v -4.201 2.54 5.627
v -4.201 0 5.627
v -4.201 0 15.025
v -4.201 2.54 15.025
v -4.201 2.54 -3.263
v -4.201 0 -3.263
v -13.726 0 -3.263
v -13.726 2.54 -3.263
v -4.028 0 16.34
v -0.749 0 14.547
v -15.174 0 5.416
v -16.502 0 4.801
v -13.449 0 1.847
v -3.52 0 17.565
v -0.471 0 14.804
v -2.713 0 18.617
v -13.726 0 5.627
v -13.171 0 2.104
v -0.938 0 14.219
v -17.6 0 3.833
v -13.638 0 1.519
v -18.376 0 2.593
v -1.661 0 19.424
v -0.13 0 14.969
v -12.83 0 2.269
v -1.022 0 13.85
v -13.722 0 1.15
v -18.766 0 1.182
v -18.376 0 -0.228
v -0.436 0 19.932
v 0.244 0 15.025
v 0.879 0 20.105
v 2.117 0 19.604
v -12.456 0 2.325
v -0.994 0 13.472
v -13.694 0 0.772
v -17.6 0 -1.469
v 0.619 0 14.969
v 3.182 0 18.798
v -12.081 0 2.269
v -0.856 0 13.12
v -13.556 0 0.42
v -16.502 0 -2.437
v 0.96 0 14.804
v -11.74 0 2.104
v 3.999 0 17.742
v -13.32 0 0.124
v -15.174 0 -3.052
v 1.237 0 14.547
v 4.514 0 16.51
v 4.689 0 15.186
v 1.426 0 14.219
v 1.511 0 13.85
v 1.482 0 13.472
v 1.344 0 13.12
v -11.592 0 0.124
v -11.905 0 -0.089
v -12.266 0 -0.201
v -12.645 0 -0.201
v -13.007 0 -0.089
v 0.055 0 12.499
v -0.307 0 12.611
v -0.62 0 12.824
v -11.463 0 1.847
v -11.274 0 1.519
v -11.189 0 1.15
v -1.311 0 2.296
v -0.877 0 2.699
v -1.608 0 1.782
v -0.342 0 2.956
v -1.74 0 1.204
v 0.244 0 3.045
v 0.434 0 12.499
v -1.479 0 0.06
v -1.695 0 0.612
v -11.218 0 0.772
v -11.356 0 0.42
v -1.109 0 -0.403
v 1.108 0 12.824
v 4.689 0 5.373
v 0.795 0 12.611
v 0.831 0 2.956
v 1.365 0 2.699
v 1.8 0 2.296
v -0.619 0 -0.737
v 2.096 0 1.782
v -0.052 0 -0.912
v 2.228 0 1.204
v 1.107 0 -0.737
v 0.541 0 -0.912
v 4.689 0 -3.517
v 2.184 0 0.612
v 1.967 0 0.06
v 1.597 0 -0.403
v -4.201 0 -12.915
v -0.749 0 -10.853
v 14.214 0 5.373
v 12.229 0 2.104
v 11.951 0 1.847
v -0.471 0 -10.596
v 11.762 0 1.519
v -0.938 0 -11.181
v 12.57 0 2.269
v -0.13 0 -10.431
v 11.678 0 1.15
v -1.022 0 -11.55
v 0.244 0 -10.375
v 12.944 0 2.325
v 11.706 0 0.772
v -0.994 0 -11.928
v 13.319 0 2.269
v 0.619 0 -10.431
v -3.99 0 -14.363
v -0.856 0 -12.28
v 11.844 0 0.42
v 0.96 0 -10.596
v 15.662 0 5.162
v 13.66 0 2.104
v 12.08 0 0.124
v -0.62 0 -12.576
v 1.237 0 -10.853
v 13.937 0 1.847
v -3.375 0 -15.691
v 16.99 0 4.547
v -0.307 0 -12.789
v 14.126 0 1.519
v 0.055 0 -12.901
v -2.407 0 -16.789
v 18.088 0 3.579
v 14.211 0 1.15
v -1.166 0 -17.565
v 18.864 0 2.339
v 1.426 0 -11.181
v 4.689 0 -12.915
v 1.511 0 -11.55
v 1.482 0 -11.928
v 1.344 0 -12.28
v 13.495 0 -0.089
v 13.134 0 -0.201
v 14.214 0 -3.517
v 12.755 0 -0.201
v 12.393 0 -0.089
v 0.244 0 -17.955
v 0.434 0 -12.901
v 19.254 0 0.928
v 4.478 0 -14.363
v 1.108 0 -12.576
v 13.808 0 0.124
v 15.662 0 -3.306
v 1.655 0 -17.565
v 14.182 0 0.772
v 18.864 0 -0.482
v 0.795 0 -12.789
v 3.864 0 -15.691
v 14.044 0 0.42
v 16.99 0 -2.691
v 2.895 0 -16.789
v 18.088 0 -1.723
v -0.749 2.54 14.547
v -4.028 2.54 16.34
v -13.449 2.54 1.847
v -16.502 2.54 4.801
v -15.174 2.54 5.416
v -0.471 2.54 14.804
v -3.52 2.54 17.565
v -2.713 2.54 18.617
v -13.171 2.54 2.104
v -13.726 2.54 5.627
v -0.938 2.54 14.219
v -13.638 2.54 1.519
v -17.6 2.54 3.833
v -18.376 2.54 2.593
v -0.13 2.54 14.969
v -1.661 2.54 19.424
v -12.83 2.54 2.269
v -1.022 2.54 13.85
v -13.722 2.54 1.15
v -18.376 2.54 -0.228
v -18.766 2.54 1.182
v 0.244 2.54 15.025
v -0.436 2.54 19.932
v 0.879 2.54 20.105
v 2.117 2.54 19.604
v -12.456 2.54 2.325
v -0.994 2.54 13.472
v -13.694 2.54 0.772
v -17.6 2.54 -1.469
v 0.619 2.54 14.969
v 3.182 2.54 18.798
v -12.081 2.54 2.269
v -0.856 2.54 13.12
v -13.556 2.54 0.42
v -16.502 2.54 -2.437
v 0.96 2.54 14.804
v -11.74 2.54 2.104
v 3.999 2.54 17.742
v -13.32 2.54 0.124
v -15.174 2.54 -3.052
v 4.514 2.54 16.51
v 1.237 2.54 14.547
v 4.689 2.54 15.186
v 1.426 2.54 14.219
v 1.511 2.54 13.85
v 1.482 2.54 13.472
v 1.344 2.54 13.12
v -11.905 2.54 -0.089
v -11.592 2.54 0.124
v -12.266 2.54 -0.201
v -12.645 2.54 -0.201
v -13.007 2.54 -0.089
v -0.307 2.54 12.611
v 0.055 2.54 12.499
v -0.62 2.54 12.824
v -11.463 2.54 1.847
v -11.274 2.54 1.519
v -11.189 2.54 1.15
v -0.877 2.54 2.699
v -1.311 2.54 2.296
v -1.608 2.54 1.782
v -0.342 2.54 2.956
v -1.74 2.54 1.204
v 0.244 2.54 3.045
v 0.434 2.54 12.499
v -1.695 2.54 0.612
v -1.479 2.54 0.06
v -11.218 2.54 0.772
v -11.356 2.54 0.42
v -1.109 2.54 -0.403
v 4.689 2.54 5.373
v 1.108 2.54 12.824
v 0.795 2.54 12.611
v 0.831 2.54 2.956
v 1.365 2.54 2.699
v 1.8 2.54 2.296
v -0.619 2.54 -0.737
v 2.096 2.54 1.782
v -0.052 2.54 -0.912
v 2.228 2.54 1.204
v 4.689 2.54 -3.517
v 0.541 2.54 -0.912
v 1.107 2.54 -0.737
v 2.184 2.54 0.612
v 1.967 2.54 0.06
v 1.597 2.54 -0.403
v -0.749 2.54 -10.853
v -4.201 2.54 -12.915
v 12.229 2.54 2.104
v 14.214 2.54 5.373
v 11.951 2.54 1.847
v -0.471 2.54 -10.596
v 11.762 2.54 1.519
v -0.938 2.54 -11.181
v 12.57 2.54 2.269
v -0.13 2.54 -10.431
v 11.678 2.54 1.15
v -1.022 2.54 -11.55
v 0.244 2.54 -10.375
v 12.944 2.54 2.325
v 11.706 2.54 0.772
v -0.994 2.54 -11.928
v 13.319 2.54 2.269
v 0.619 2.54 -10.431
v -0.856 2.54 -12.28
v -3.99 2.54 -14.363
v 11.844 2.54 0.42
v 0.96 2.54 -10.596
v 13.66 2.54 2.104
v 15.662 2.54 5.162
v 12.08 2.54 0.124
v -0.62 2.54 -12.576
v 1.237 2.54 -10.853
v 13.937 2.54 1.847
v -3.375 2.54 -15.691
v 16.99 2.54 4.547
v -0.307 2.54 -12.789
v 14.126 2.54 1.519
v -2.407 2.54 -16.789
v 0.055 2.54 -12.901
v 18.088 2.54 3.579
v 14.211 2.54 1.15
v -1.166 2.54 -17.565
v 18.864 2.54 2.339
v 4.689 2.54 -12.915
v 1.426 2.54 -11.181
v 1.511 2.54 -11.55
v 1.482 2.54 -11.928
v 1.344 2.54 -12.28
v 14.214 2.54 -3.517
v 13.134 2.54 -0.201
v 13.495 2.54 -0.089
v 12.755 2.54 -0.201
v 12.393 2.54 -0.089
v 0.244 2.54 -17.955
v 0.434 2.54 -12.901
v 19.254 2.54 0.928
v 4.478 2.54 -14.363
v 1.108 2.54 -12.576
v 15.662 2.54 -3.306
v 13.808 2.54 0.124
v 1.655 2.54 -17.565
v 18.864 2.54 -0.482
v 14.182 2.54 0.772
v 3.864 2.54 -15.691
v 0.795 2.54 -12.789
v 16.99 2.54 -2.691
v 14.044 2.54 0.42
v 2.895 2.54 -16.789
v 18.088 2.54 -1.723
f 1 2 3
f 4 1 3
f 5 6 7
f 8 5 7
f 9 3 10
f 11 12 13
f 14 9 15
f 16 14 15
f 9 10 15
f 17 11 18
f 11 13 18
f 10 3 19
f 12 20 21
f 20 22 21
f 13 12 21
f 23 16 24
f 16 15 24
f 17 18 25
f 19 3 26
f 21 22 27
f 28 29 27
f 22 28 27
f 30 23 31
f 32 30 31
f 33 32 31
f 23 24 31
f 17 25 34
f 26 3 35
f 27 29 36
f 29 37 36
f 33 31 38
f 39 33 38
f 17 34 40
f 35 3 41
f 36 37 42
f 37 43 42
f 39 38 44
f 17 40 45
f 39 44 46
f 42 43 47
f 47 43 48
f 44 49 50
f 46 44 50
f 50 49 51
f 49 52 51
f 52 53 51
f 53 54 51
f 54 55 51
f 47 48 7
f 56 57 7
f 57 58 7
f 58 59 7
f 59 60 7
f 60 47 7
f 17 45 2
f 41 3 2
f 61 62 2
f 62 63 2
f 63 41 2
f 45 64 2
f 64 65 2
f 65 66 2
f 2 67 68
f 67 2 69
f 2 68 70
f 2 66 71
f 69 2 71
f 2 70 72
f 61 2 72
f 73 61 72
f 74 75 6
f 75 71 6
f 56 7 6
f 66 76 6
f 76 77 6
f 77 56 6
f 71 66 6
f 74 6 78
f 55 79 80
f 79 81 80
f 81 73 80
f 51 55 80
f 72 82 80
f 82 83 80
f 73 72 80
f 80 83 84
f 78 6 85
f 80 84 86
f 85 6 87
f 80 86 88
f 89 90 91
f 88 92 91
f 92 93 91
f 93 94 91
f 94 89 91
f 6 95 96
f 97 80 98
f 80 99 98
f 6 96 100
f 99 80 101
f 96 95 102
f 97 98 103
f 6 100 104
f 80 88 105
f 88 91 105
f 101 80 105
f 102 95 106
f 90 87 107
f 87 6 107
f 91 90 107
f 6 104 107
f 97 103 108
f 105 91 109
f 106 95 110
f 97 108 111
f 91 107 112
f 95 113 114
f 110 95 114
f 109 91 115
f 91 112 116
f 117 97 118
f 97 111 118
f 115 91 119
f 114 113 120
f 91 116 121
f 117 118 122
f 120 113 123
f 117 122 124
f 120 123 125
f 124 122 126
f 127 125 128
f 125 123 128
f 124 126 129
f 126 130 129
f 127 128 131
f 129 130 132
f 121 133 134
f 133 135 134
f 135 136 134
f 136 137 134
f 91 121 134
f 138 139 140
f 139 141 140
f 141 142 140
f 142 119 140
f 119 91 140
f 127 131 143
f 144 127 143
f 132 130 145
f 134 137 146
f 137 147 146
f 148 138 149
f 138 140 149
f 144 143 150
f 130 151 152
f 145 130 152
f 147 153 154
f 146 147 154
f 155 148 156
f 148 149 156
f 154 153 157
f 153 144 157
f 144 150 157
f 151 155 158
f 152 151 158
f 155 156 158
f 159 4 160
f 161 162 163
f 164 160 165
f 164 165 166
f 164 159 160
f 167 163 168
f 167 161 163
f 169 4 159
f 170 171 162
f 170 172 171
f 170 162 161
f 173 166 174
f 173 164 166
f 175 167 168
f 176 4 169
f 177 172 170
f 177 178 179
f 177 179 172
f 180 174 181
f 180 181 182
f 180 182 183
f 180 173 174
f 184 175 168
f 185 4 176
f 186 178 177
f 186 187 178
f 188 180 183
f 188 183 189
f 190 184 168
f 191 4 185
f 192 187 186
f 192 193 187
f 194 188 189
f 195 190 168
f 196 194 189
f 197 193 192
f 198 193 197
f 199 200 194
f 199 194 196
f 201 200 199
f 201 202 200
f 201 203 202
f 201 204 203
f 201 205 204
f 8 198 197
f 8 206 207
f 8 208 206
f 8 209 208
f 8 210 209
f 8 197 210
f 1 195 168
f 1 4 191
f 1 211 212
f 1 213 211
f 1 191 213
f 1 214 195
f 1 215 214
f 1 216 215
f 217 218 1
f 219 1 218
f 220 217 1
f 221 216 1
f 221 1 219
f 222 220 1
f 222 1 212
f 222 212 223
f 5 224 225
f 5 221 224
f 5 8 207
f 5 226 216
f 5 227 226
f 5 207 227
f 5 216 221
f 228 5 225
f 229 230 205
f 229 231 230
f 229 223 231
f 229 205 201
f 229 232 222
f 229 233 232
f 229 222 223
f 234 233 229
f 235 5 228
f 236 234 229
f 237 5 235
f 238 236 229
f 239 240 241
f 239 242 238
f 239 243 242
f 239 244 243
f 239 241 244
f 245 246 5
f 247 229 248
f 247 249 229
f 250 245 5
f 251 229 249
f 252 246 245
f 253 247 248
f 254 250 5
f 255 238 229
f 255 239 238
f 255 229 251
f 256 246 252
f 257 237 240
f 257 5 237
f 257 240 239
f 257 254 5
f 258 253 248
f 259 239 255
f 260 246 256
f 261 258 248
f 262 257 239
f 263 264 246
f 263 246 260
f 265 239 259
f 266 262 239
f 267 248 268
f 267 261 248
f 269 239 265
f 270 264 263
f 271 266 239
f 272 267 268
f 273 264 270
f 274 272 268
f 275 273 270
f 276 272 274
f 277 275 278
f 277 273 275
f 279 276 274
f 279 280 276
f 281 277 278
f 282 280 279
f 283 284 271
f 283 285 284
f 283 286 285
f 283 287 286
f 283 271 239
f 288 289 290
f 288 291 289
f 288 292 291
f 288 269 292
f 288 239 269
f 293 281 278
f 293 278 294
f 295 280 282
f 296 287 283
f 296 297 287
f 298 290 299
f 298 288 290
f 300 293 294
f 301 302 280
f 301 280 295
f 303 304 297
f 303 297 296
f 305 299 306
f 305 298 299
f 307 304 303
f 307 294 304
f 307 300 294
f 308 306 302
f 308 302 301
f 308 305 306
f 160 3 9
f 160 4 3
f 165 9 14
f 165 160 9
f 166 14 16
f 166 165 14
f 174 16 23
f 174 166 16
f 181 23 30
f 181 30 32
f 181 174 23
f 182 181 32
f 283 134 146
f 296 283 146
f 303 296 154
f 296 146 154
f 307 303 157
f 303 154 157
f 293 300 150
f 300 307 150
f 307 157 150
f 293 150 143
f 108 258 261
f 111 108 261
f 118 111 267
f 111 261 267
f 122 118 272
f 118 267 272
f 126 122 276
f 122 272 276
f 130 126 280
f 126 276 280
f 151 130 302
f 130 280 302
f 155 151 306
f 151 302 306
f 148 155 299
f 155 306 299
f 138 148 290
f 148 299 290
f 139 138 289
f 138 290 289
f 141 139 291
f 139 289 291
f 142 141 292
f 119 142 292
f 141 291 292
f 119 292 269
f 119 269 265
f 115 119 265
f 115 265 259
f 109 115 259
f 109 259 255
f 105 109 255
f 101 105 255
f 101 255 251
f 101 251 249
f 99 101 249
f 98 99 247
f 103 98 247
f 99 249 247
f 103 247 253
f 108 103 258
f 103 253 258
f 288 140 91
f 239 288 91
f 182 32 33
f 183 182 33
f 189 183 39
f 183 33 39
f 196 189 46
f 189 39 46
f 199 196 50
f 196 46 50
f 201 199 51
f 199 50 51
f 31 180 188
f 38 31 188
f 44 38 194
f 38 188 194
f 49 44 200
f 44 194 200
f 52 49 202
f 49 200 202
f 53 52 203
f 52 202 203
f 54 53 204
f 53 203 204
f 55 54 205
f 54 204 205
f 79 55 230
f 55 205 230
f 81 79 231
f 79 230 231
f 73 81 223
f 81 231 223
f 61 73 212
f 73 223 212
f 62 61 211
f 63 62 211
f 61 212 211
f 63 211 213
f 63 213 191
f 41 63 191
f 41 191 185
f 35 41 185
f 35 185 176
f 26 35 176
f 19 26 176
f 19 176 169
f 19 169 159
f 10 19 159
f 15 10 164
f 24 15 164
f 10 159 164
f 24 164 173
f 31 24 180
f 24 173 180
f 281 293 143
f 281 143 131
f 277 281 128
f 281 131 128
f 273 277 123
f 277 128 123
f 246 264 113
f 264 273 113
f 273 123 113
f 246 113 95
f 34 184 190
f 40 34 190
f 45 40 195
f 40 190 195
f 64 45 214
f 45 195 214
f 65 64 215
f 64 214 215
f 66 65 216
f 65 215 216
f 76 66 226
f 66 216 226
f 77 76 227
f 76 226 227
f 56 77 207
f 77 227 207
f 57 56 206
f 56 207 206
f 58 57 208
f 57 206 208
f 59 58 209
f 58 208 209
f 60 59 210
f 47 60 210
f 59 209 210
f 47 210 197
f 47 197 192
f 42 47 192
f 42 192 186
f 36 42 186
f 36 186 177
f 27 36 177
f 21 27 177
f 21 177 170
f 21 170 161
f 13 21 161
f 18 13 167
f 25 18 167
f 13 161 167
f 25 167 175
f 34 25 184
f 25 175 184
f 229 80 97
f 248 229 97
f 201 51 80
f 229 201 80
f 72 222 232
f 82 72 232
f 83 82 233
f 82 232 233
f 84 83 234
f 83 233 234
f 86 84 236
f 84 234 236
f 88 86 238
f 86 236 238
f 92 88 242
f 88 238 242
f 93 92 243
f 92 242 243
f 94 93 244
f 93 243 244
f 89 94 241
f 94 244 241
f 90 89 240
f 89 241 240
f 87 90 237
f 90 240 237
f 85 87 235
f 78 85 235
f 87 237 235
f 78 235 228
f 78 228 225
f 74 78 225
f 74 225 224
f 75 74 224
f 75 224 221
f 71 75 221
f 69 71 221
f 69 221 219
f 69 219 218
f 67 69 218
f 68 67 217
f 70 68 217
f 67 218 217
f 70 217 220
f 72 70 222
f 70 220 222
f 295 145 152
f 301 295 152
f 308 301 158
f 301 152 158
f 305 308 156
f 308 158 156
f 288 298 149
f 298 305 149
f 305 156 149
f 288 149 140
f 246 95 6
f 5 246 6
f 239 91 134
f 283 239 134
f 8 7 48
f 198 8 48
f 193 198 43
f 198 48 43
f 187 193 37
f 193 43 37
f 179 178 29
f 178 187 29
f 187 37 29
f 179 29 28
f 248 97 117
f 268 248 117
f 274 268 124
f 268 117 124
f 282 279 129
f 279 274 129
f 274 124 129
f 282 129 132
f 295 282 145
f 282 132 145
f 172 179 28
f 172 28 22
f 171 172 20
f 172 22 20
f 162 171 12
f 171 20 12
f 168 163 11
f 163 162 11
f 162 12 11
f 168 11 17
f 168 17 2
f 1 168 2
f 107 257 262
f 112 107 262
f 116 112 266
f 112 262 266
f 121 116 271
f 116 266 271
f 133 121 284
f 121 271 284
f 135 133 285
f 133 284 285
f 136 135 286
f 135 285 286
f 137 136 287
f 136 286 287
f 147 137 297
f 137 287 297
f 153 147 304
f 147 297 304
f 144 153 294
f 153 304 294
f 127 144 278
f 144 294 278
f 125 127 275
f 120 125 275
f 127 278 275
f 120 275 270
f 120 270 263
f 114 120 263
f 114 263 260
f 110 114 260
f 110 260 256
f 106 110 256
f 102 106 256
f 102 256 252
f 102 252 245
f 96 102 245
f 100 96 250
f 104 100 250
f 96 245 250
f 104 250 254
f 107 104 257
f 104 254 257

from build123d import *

# Parameters (mm, degrees)
BOSS_EXTRUDE1_DEPTH = 2.54
FILLET1_R           = 5.08
FILLET2_R           = 5.08
SKETCH2_R           = 1.989538673
SKETCH2_R_2         = 1.27
CUT_EXTRUDE1_DEPTH  = 2.54


with BuildPart() as part:
    # Sketch1 → Boss-Extrude1 (new body)
    with BuildSketch(Plane(origin=(0, 0, 0), x_dir=(1, 0, 0), z_dir=(0, 1, 0))):
        Polygon((-4.200769231, 17.994923077), (-4.200769231, 3.262923077), (-18.805769231, 3.262923077), (-18.805769231, -5.627076923), (-4.200769231, -5.627076923), (-4.200769231, -20.105076923), (4.689230769, -20.105076923), (4.689230769, -5.373076923), (19.294230769, -5.373076923), (19.294230769, 3.516923077), (4.689230769, 3.516923077), (4.689230769, 17.994923077), align=None)
    extrude(amount=BOSS_EXTRUDE1_DEPTH)

    # Fillet1
    fillet1_edges = [part.edges().sort_by_distance(p)[0] for p in [
        (-4.200769231, 1.27, 20.105076923),
    ]]
    fillet(fillet1_edges, radius=FILLET1_R)

    # Fillet2
    # the kernel refuses this fillet: 5.08 mm, written as the material it takes off along each edge
    with BuildSketch(Plane(origin=(-4.200769231, -12.7, -17.994923077), x_dir=(0, 0, 1), z_dir=(0, 1, 0)), Plane(origin=(-18.805769231, -12.7, -3.262923077), x_dir=(0, 0, 1), z_dir=(0, 1, 0)), Plane(origin=(-18.805769231, -12.7, 5.627076923), x_dir=(1, 0, 0), z_dir=(0, 1, 0)), Plane(origin=(4.689230769, -12.7, -17.994923077), x_dir=(-1, 0, 0), z_dir=(0, 1, 0))) as fillet2_piece_1:
        with BuildLine():
            CenterArc((FILLET2_R, FILLET2_R), FILLET2_R, 180, 90)
            Line((0, FILLET2_R), (-FILLET2_R * 0.02, FILLET2_R))
            Line((-FILLET2_R * 0.02, FILLET2_R), (-FILLET2_R * 0.02, -FILLET2_R * 0.02))
            Line((-FILLET2_R * 0.02, -FILLET2_R * 0.02), (FILLET2_R, -FILLET2_R * 0.02))
            Line((FILLET2_R, -FILLET2_R * 0.02), (FILLET2_R, 0))
        make_face()
    extrude(amount=27.94, mode=Mode.SUBTRACT)
    with BuildSketch(Plane(origin=(19.294230769, -12.7, -3.516923077), x_dir=(0, 0, 1), z_dir=(0, 1, 0)), Plane(origin=(19.294230769, -12.7, 5.373076923), x_dir=(-1, 0, 0), z_dir=(0, 1, 0))) as fillet2_piece_2:
        with BuildLine():
            CenterArc((FILLET2_R, -FILLET2_R), FILLET2_R, 90, 90)
            Line((0, -FILLET2_R), (-FILLET2_R * 0.02, -FILLET2_R))
            Line((-FILLET2_R * 0.02, -FILLET2_R), (-FILLET2_R * 0.02, FILLET2_R * 0.02))
            Line((-FILLET2_R * 0.02, FILLET2_R * 0.02), (FILLET2_R, FILLET2_R * 0.02))
            Line((FILLET2_R, FILLET2_R * 0.02), (FILLET2_R, 0))
        make_face()
    extrude(amount=27.94, mode=Mode.SUBTRACT)
    with BuildSketch(Plane(origin=(4.689230769, -12.296722124, 20.105076923), x_dir=(-1, 0, 0), z_dir=(0, 1, 0))) as fillet2_piece_3:
        with BuildLine():
            CenterArc((5.08, -4.91868885), FILLET2_R, 104.477512186, 75.522487814)
            Line((0, -4.91868885), (-0.1016, -4.91868885))
            Line((-0.1016, -4.91868885), (-0.1016, 0))
            Line((-0.1016, 0), (0, 0.1016))
            ThreePointArc((0, 0.1016), (1.905, 0.1016), (3.7846, 0.098373777))
            Line((3.7846, 0.098373777), (3.81, 0))
        make_face()
    extrude(amount=27.133444248, mode=Mode.SUBTRACT)

    # Sketch2 → Cut-Extrude1 (cut)
    with BuildSketch(Plane(origin=(0, 2.54, 0), x_dir=(1, 0, 0), z_dir=(0, 1, 0))):
        with Locations(Location((0.244230769, -1.055076923, 0), (0, 0, 270))):
            Circle(SKETCH2_R)
        with Locations(Location((0.244230769, 11.644923077, 0), (0, 0, 270))):
            Circle(SKETCH2_R_2)
        with Locations(Location((0.244230769, -13.755076923, 0), (0, 0, 270))):
            Circle(SKETCH2_R_2)
        with Locations(Location((-12.455769231, -1.055076923, 0), (0, 0, 270))):
            Circle(SKETCH2_R_2)
        with Locations(Location((12.944230769, -1.055076923, 0), (0, 0, 270))):
            Circle(SKETCH2_R_2)
    extrude(amount=-CUT_EXTRUDE1_DEPTH, mode=Mode.SUBTRACT)


solid = part.part
